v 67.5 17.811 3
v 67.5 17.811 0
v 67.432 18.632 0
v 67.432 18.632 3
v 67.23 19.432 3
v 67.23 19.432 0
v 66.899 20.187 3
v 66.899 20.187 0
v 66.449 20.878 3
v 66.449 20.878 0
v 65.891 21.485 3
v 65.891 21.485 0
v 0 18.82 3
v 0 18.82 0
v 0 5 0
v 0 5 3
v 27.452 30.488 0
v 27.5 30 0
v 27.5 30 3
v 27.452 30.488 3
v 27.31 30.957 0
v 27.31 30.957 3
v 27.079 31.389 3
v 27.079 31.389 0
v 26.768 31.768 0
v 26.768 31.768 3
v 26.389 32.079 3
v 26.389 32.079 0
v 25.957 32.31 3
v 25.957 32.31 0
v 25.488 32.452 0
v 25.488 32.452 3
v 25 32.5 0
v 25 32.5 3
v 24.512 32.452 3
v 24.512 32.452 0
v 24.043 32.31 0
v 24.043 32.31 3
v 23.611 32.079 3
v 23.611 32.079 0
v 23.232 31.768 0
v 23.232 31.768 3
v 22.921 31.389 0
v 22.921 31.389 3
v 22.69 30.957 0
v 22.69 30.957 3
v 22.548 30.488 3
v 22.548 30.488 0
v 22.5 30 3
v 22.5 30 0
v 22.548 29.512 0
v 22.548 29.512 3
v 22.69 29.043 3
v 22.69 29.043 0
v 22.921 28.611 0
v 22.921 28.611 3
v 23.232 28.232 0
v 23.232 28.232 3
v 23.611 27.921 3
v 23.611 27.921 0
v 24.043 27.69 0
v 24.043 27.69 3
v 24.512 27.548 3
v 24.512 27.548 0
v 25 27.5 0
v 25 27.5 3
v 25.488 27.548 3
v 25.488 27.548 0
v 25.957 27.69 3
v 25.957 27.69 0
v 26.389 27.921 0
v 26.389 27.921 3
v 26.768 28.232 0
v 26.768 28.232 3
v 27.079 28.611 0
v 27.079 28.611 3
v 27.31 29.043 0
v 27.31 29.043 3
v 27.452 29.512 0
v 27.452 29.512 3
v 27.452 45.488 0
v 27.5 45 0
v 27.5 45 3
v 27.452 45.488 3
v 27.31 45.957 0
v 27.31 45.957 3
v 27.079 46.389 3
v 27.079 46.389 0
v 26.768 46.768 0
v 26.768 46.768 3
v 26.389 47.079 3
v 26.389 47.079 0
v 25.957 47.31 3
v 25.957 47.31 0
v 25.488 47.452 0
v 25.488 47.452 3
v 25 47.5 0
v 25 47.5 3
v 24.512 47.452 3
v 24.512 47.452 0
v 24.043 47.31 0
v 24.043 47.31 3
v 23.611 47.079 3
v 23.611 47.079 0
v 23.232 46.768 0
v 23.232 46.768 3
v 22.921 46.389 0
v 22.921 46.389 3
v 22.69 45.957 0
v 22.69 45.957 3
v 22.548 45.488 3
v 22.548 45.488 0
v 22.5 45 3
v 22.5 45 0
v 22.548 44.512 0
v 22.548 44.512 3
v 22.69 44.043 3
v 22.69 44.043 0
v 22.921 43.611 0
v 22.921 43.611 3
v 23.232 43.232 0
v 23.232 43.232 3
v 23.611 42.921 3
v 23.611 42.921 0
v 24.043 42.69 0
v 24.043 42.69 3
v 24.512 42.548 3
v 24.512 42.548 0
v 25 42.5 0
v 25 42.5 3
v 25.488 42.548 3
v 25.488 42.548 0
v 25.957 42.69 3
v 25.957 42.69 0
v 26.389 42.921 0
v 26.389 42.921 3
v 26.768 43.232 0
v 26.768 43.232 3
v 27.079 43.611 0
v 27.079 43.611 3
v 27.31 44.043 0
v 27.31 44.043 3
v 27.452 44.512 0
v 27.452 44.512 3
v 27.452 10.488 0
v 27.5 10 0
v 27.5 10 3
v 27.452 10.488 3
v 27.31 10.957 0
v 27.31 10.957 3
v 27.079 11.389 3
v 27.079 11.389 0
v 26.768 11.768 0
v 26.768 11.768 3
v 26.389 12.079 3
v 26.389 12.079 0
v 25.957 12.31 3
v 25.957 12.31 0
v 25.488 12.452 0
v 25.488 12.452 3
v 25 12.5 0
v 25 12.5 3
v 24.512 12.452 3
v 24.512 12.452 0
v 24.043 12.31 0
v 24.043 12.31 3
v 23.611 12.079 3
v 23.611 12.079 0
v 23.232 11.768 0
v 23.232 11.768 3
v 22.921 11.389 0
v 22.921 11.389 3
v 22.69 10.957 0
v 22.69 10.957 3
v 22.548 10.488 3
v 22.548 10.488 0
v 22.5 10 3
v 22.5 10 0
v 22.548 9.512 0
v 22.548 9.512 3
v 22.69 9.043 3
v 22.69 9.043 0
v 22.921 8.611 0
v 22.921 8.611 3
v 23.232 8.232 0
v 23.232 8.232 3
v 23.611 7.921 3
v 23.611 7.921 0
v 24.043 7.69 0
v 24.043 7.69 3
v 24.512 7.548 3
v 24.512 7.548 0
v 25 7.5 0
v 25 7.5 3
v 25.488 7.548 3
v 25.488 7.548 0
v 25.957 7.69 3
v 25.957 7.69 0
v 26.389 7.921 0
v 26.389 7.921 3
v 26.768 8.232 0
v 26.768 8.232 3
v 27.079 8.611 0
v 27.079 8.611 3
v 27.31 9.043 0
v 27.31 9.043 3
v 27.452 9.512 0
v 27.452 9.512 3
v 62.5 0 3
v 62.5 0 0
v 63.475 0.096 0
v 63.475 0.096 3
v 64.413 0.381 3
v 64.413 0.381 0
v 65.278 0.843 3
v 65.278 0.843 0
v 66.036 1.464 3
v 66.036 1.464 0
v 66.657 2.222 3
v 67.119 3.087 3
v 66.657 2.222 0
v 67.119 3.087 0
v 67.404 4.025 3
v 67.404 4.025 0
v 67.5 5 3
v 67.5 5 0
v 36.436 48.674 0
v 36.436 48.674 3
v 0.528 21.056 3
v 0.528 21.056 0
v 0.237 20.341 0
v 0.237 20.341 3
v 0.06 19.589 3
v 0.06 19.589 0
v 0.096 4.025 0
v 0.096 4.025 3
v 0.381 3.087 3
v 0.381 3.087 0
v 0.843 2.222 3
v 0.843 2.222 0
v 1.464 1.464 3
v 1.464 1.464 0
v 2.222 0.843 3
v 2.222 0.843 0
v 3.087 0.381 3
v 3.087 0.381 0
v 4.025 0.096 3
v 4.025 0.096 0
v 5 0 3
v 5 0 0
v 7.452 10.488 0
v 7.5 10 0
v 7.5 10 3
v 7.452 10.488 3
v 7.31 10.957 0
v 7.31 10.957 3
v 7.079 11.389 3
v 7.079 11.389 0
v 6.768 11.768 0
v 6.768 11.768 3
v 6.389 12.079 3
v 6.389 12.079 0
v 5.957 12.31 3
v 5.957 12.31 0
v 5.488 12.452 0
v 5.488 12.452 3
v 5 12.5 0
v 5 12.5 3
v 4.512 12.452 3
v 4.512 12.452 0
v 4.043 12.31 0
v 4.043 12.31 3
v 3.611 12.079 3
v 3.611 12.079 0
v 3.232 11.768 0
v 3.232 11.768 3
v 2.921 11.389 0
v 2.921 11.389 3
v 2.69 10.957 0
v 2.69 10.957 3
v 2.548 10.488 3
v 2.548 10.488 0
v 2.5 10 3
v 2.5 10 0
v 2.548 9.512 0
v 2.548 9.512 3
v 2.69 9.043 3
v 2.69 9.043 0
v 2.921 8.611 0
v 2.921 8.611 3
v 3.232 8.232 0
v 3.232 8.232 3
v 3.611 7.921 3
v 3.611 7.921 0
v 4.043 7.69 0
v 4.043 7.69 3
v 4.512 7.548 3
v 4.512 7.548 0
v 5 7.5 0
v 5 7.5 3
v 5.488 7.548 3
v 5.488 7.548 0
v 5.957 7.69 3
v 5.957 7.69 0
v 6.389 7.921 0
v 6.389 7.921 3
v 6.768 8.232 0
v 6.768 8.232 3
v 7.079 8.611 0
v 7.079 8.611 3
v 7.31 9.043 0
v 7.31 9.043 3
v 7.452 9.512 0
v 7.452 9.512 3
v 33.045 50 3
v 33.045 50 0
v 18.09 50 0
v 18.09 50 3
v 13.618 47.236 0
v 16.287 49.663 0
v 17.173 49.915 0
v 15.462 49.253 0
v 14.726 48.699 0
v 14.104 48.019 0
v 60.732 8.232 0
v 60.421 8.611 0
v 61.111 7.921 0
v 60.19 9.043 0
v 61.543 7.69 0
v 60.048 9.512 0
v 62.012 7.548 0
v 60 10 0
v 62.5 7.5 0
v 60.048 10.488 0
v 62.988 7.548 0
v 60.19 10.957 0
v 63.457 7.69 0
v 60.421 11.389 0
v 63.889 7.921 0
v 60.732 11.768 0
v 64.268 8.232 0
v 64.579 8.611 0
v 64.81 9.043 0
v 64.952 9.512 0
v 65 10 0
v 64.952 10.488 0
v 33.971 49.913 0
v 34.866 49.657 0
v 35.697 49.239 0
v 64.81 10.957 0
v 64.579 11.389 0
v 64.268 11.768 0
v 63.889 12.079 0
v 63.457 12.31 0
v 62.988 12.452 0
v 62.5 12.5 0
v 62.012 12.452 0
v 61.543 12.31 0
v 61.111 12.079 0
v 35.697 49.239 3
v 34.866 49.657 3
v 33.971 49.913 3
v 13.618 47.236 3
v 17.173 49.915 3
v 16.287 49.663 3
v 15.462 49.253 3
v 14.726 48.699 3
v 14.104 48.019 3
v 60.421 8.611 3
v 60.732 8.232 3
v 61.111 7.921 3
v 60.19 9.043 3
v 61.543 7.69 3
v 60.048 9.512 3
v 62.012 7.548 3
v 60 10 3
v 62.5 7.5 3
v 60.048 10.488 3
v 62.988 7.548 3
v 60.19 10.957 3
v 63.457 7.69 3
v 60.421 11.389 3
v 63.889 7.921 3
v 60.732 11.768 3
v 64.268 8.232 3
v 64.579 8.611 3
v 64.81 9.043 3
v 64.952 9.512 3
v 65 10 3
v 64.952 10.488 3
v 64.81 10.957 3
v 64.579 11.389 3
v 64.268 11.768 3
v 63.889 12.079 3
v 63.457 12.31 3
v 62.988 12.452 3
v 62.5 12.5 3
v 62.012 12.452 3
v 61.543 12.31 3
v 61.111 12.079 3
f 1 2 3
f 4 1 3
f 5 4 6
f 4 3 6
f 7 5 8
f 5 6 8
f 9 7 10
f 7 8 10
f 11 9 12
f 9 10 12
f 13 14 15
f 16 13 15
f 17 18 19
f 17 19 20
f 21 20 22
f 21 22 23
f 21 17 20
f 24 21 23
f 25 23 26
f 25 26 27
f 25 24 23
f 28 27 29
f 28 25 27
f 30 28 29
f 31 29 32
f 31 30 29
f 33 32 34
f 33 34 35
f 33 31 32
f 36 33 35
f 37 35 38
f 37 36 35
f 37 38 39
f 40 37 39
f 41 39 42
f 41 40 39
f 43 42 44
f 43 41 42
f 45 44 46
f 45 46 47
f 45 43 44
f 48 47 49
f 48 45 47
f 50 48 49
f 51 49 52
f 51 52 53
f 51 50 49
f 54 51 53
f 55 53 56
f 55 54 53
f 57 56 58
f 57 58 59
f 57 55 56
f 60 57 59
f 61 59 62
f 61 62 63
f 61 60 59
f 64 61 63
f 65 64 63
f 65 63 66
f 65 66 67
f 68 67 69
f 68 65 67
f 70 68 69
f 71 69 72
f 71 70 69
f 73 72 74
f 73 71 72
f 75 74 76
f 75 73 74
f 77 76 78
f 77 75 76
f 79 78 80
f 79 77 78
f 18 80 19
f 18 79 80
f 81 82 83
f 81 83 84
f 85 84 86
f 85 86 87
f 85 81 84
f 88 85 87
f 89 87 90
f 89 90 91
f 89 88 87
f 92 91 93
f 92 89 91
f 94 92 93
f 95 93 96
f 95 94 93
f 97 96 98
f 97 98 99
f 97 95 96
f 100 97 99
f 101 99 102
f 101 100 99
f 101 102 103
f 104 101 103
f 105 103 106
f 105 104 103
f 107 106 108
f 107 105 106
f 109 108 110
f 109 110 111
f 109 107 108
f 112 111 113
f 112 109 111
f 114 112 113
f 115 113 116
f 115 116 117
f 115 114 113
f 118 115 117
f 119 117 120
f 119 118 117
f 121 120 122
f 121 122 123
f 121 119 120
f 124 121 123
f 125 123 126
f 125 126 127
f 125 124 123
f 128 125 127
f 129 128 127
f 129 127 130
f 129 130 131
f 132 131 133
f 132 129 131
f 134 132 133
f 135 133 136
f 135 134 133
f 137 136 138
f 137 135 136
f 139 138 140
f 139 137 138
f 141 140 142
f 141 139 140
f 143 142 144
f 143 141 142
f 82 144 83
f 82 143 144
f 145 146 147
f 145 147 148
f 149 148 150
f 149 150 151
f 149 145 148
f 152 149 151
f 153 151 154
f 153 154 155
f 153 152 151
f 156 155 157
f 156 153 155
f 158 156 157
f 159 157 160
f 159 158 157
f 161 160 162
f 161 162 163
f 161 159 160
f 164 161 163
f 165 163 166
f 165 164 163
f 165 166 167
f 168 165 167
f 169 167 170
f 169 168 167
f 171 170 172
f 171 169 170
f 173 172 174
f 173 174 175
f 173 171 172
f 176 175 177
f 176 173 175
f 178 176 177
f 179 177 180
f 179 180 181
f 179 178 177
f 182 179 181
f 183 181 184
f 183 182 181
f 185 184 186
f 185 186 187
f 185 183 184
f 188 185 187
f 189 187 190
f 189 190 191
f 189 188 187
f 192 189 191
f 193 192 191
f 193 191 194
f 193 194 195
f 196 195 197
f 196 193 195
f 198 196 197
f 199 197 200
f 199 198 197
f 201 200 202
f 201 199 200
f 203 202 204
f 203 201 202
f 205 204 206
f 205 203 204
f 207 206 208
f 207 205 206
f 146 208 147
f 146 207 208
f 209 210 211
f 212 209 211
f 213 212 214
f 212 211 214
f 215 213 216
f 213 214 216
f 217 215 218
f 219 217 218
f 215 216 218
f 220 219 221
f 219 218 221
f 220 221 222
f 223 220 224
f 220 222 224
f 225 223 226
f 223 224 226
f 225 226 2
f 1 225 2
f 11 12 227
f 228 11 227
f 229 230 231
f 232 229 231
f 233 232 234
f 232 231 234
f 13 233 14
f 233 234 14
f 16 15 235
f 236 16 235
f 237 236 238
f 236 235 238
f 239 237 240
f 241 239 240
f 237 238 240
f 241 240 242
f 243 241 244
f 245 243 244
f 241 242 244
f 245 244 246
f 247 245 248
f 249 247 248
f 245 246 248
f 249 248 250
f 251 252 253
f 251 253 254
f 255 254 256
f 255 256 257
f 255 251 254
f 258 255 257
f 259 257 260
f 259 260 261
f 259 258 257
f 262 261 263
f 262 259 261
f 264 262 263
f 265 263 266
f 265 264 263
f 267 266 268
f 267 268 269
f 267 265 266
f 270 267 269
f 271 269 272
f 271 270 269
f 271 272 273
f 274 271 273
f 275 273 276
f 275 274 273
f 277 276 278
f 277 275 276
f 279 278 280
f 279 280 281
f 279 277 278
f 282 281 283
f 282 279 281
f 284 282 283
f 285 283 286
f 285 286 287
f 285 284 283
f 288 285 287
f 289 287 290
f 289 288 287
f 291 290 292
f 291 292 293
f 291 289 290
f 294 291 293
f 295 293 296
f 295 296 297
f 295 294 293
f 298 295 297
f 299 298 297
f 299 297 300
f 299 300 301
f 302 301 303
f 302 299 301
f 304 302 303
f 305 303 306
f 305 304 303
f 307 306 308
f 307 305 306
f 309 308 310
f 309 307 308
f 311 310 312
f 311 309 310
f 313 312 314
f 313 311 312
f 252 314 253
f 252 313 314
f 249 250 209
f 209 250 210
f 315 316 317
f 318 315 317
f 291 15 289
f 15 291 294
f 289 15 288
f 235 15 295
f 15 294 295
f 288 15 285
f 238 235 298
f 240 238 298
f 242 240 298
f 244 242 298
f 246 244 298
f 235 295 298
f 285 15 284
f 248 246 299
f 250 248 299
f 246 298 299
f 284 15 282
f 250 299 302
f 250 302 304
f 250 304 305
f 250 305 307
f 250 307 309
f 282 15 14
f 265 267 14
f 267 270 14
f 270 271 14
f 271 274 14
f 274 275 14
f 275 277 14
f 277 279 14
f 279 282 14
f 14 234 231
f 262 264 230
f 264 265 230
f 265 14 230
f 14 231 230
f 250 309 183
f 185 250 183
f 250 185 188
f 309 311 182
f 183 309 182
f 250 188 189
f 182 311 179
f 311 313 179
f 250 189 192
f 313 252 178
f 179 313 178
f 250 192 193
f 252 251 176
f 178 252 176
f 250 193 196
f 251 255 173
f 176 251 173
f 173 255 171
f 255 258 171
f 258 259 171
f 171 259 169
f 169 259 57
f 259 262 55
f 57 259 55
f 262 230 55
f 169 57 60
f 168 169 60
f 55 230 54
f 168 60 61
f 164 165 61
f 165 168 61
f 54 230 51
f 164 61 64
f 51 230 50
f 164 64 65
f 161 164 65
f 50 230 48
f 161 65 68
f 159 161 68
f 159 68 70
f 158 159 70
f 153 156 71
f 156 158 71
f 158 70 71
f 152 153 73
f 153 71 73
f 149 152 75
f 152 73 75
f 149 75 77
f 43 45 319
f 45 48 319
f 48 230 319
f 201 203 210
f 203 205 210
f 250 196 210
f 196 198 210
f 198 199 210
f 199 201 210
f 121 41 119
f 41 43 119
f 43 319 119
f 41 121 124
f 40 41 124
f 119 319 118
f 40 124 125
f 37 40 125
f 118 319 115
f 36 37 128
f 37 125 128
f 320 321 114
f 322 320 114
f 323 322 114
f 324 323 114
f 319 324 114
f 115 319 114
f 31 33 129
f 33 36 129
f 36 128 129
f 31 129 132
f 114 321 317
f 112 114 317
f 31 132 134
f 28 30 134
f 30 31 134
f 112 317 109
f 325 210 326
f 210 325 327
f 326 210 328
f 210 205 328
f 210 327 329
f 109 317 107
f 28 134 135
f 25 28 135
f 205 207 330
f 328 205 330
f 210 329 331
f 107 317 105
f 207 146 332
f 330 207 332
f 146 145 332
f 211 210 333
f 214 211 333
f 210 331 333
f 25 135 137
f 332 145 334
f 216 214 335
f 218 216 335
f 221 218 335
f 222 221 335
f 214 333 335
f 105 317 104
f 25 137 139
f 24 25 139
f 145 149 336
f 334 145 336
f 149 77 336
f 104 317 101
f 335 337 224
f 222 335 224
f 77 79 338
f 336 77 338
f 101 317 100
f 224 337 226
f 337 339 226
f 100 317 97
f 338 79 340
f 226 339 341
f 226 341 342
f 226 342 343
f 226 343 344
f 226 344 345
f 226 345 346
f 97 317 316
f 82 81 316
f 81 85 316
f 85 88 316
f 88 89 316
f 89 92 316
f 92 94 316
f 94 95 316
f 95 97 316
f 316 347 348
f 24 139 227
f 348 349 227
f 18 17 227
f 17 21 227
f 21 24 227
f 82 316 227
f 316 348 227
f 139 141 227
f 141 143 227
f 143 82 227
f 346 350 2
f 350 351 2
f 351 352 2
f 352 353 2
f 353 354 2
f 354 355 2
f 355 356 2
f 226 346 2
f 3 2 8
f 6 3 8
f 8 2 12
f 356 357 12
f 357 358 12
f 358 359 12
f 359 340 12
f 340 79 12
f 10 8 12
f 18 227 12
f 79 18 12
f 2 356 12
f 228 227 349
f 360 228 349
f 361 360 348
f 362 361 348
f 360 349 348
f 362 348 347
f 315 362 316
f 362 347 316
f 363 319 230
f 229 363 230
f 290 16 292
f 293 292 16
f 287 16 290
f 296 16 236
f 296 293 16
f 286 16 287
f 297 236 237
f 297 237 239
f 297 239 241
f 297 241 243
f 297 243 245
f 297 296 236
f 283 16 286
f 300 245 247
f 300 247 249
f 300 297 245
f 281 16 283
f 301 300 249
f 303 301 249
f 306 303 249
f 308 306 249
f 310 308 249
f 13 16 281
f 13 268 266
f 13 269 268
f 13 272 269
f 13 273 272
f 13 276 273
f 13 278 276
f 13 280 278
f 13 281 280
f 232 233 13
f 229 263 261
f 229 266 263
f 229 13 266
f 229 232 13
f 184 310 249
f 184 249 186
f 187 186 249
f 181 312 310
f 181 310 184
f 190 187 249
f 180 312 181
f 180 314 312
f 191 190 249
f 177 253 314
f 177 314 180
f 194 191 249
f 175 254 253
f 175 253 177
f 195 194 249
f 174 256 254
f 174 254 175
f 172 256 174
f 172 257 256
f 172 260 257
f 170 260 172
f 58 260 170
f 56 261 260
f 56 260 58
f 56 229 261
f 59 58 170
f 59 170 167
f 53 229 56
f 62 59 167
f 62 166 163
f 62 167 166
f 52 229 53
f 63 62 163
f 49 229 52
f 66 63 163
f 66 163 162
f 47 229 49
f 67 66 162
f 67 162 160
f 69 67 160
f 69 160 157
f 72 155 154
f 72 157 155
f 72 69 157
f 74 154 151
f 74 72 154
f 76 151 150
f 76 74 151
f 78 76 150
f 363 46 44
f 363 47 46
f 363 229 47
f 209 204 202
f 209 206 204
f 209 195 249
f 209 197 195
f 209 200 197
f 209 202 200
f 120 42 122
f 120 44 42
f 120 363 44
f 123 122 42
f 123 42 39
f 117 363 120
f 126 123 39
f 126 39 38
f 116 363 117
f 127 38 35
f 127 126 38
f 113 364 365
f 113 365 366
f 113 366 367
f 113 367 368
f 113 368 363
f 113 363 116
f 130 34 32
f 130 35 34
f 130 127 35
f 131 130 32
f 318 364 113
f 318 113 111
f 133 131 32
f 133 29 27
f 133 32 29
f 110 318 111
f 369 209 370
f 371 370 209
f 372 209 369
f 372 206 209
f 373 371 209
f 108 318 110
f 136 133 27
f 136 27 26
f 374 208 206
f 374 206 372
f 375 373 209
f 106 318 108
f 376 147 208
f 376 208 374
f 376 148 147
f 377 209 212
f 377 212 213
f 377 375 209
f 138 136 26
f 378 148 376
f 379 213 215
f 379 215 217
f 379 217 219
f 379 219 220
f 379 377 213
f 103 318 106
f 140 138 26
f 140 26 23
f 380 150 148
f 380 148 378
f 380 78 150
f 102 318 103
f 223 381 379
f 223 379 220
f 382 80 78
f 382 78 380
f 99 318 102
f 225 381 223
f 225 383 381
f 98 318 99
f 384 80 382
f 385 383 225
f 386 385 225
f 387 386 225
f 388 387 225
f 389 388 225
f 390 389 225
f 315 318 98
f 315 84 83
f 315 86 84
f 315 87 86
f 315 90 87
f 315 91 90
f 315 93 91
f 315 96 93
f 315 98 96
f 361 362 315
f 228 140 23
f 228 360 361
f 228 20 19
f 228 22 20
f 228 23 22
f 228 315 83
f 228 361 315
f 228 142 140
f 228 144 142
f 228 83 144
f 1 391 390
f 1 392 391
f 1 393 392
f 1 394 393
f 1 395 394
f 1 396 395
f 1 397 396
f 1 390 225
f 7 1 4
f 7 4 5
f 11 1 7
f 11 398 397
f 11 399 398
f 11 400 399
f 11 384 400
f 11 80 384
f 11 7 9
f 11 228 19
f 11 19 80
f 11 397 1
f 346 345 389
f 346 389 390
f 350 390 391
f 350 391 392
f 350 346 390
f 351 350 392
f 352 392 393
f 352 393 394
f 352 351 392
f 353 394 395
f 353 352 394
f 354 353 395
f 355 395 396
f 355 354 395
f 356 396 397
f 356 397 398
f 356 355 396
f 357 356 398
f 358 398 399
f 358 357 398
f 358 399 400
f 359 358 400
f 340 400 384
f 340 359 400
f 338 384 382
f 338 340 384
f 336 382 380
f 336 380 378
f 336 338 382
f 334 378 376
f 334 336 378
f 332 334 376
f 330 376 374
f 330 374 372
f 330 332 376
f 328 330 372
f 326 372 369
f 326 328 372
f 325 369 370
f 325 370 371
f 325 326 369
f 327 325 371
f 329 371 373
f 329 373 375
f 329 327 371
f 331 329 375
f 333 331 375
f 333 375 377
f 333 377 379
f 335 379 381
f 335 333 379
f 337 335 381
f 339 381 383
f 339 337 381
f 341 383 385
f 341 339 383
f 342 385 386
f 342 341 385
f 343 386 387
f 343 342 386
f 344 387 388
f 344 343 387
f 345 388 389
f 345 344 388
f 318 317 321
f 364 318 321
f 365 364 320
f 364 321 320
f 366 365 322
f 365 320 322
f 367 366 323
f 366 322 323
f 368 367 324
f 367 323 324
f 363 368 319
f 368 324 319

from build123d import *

# Parameters (mm, degrees)
F0_R     = 2.5
F1_DEPTH = 3


with BuildPart() as f1:
    # F0 (on Top) → F1 (new body)
    with BuildSketch(Plane.XY):
        with BuildLine():
            Line((0, 18.81966), (0, 5))
            ThreePointArc((0, 5), (1.464466, 1.464466), (5, 0))
            Line((5, 0), (62.5, 0))
            ThreePointArc((62.5, 0), (66.035534, 1.464466), (67.5, 5))
            Line((67.5, 5), (67.5, 17.810844))
            ThreePointArc((67.5, 17.810844), (67.080229, 19.816211), (65.891401, 21.484861))
            Line((65.891401, 21.484861), (36.436481, 48.674017))
            ThreePointArc((36.436481, 48.674017), (34.865783, 49.65672), (33.045081, 50))
            Line((33.045081, 50), (18.09017, 50))
            ThreePointArc((18.09017, 50), (15.461514, 49.253254), (13.618034, 47.236068))
            Line((13.618034, 47.236068), (0.527864, 21.055728))
            ThreePointArc((0.527864, 21.055728), (0.133755, 19.968425), (0, 18.81966))
        make_face()
        with Locations((5, 10)):
            Circle(F0_R, mode=Mode.SUBTRACT)
        with Locations((25, 10)):
            Circle(F0_R, mode=Mode.SUBTRACT)
        with Locations((62.5, 10)):
            Circle(F0_R, mode=Mode.SUBTRACT)
        with Locations((25, 30)):
            Circle(F0_R, mode=Mode.SUBTRACT)
        with Locations((25, 45)):
            Circle(F0_R, mode=Mode.SUBTRACT)
    extrude(amount=F1_DEPTH)


solid = f1.part
